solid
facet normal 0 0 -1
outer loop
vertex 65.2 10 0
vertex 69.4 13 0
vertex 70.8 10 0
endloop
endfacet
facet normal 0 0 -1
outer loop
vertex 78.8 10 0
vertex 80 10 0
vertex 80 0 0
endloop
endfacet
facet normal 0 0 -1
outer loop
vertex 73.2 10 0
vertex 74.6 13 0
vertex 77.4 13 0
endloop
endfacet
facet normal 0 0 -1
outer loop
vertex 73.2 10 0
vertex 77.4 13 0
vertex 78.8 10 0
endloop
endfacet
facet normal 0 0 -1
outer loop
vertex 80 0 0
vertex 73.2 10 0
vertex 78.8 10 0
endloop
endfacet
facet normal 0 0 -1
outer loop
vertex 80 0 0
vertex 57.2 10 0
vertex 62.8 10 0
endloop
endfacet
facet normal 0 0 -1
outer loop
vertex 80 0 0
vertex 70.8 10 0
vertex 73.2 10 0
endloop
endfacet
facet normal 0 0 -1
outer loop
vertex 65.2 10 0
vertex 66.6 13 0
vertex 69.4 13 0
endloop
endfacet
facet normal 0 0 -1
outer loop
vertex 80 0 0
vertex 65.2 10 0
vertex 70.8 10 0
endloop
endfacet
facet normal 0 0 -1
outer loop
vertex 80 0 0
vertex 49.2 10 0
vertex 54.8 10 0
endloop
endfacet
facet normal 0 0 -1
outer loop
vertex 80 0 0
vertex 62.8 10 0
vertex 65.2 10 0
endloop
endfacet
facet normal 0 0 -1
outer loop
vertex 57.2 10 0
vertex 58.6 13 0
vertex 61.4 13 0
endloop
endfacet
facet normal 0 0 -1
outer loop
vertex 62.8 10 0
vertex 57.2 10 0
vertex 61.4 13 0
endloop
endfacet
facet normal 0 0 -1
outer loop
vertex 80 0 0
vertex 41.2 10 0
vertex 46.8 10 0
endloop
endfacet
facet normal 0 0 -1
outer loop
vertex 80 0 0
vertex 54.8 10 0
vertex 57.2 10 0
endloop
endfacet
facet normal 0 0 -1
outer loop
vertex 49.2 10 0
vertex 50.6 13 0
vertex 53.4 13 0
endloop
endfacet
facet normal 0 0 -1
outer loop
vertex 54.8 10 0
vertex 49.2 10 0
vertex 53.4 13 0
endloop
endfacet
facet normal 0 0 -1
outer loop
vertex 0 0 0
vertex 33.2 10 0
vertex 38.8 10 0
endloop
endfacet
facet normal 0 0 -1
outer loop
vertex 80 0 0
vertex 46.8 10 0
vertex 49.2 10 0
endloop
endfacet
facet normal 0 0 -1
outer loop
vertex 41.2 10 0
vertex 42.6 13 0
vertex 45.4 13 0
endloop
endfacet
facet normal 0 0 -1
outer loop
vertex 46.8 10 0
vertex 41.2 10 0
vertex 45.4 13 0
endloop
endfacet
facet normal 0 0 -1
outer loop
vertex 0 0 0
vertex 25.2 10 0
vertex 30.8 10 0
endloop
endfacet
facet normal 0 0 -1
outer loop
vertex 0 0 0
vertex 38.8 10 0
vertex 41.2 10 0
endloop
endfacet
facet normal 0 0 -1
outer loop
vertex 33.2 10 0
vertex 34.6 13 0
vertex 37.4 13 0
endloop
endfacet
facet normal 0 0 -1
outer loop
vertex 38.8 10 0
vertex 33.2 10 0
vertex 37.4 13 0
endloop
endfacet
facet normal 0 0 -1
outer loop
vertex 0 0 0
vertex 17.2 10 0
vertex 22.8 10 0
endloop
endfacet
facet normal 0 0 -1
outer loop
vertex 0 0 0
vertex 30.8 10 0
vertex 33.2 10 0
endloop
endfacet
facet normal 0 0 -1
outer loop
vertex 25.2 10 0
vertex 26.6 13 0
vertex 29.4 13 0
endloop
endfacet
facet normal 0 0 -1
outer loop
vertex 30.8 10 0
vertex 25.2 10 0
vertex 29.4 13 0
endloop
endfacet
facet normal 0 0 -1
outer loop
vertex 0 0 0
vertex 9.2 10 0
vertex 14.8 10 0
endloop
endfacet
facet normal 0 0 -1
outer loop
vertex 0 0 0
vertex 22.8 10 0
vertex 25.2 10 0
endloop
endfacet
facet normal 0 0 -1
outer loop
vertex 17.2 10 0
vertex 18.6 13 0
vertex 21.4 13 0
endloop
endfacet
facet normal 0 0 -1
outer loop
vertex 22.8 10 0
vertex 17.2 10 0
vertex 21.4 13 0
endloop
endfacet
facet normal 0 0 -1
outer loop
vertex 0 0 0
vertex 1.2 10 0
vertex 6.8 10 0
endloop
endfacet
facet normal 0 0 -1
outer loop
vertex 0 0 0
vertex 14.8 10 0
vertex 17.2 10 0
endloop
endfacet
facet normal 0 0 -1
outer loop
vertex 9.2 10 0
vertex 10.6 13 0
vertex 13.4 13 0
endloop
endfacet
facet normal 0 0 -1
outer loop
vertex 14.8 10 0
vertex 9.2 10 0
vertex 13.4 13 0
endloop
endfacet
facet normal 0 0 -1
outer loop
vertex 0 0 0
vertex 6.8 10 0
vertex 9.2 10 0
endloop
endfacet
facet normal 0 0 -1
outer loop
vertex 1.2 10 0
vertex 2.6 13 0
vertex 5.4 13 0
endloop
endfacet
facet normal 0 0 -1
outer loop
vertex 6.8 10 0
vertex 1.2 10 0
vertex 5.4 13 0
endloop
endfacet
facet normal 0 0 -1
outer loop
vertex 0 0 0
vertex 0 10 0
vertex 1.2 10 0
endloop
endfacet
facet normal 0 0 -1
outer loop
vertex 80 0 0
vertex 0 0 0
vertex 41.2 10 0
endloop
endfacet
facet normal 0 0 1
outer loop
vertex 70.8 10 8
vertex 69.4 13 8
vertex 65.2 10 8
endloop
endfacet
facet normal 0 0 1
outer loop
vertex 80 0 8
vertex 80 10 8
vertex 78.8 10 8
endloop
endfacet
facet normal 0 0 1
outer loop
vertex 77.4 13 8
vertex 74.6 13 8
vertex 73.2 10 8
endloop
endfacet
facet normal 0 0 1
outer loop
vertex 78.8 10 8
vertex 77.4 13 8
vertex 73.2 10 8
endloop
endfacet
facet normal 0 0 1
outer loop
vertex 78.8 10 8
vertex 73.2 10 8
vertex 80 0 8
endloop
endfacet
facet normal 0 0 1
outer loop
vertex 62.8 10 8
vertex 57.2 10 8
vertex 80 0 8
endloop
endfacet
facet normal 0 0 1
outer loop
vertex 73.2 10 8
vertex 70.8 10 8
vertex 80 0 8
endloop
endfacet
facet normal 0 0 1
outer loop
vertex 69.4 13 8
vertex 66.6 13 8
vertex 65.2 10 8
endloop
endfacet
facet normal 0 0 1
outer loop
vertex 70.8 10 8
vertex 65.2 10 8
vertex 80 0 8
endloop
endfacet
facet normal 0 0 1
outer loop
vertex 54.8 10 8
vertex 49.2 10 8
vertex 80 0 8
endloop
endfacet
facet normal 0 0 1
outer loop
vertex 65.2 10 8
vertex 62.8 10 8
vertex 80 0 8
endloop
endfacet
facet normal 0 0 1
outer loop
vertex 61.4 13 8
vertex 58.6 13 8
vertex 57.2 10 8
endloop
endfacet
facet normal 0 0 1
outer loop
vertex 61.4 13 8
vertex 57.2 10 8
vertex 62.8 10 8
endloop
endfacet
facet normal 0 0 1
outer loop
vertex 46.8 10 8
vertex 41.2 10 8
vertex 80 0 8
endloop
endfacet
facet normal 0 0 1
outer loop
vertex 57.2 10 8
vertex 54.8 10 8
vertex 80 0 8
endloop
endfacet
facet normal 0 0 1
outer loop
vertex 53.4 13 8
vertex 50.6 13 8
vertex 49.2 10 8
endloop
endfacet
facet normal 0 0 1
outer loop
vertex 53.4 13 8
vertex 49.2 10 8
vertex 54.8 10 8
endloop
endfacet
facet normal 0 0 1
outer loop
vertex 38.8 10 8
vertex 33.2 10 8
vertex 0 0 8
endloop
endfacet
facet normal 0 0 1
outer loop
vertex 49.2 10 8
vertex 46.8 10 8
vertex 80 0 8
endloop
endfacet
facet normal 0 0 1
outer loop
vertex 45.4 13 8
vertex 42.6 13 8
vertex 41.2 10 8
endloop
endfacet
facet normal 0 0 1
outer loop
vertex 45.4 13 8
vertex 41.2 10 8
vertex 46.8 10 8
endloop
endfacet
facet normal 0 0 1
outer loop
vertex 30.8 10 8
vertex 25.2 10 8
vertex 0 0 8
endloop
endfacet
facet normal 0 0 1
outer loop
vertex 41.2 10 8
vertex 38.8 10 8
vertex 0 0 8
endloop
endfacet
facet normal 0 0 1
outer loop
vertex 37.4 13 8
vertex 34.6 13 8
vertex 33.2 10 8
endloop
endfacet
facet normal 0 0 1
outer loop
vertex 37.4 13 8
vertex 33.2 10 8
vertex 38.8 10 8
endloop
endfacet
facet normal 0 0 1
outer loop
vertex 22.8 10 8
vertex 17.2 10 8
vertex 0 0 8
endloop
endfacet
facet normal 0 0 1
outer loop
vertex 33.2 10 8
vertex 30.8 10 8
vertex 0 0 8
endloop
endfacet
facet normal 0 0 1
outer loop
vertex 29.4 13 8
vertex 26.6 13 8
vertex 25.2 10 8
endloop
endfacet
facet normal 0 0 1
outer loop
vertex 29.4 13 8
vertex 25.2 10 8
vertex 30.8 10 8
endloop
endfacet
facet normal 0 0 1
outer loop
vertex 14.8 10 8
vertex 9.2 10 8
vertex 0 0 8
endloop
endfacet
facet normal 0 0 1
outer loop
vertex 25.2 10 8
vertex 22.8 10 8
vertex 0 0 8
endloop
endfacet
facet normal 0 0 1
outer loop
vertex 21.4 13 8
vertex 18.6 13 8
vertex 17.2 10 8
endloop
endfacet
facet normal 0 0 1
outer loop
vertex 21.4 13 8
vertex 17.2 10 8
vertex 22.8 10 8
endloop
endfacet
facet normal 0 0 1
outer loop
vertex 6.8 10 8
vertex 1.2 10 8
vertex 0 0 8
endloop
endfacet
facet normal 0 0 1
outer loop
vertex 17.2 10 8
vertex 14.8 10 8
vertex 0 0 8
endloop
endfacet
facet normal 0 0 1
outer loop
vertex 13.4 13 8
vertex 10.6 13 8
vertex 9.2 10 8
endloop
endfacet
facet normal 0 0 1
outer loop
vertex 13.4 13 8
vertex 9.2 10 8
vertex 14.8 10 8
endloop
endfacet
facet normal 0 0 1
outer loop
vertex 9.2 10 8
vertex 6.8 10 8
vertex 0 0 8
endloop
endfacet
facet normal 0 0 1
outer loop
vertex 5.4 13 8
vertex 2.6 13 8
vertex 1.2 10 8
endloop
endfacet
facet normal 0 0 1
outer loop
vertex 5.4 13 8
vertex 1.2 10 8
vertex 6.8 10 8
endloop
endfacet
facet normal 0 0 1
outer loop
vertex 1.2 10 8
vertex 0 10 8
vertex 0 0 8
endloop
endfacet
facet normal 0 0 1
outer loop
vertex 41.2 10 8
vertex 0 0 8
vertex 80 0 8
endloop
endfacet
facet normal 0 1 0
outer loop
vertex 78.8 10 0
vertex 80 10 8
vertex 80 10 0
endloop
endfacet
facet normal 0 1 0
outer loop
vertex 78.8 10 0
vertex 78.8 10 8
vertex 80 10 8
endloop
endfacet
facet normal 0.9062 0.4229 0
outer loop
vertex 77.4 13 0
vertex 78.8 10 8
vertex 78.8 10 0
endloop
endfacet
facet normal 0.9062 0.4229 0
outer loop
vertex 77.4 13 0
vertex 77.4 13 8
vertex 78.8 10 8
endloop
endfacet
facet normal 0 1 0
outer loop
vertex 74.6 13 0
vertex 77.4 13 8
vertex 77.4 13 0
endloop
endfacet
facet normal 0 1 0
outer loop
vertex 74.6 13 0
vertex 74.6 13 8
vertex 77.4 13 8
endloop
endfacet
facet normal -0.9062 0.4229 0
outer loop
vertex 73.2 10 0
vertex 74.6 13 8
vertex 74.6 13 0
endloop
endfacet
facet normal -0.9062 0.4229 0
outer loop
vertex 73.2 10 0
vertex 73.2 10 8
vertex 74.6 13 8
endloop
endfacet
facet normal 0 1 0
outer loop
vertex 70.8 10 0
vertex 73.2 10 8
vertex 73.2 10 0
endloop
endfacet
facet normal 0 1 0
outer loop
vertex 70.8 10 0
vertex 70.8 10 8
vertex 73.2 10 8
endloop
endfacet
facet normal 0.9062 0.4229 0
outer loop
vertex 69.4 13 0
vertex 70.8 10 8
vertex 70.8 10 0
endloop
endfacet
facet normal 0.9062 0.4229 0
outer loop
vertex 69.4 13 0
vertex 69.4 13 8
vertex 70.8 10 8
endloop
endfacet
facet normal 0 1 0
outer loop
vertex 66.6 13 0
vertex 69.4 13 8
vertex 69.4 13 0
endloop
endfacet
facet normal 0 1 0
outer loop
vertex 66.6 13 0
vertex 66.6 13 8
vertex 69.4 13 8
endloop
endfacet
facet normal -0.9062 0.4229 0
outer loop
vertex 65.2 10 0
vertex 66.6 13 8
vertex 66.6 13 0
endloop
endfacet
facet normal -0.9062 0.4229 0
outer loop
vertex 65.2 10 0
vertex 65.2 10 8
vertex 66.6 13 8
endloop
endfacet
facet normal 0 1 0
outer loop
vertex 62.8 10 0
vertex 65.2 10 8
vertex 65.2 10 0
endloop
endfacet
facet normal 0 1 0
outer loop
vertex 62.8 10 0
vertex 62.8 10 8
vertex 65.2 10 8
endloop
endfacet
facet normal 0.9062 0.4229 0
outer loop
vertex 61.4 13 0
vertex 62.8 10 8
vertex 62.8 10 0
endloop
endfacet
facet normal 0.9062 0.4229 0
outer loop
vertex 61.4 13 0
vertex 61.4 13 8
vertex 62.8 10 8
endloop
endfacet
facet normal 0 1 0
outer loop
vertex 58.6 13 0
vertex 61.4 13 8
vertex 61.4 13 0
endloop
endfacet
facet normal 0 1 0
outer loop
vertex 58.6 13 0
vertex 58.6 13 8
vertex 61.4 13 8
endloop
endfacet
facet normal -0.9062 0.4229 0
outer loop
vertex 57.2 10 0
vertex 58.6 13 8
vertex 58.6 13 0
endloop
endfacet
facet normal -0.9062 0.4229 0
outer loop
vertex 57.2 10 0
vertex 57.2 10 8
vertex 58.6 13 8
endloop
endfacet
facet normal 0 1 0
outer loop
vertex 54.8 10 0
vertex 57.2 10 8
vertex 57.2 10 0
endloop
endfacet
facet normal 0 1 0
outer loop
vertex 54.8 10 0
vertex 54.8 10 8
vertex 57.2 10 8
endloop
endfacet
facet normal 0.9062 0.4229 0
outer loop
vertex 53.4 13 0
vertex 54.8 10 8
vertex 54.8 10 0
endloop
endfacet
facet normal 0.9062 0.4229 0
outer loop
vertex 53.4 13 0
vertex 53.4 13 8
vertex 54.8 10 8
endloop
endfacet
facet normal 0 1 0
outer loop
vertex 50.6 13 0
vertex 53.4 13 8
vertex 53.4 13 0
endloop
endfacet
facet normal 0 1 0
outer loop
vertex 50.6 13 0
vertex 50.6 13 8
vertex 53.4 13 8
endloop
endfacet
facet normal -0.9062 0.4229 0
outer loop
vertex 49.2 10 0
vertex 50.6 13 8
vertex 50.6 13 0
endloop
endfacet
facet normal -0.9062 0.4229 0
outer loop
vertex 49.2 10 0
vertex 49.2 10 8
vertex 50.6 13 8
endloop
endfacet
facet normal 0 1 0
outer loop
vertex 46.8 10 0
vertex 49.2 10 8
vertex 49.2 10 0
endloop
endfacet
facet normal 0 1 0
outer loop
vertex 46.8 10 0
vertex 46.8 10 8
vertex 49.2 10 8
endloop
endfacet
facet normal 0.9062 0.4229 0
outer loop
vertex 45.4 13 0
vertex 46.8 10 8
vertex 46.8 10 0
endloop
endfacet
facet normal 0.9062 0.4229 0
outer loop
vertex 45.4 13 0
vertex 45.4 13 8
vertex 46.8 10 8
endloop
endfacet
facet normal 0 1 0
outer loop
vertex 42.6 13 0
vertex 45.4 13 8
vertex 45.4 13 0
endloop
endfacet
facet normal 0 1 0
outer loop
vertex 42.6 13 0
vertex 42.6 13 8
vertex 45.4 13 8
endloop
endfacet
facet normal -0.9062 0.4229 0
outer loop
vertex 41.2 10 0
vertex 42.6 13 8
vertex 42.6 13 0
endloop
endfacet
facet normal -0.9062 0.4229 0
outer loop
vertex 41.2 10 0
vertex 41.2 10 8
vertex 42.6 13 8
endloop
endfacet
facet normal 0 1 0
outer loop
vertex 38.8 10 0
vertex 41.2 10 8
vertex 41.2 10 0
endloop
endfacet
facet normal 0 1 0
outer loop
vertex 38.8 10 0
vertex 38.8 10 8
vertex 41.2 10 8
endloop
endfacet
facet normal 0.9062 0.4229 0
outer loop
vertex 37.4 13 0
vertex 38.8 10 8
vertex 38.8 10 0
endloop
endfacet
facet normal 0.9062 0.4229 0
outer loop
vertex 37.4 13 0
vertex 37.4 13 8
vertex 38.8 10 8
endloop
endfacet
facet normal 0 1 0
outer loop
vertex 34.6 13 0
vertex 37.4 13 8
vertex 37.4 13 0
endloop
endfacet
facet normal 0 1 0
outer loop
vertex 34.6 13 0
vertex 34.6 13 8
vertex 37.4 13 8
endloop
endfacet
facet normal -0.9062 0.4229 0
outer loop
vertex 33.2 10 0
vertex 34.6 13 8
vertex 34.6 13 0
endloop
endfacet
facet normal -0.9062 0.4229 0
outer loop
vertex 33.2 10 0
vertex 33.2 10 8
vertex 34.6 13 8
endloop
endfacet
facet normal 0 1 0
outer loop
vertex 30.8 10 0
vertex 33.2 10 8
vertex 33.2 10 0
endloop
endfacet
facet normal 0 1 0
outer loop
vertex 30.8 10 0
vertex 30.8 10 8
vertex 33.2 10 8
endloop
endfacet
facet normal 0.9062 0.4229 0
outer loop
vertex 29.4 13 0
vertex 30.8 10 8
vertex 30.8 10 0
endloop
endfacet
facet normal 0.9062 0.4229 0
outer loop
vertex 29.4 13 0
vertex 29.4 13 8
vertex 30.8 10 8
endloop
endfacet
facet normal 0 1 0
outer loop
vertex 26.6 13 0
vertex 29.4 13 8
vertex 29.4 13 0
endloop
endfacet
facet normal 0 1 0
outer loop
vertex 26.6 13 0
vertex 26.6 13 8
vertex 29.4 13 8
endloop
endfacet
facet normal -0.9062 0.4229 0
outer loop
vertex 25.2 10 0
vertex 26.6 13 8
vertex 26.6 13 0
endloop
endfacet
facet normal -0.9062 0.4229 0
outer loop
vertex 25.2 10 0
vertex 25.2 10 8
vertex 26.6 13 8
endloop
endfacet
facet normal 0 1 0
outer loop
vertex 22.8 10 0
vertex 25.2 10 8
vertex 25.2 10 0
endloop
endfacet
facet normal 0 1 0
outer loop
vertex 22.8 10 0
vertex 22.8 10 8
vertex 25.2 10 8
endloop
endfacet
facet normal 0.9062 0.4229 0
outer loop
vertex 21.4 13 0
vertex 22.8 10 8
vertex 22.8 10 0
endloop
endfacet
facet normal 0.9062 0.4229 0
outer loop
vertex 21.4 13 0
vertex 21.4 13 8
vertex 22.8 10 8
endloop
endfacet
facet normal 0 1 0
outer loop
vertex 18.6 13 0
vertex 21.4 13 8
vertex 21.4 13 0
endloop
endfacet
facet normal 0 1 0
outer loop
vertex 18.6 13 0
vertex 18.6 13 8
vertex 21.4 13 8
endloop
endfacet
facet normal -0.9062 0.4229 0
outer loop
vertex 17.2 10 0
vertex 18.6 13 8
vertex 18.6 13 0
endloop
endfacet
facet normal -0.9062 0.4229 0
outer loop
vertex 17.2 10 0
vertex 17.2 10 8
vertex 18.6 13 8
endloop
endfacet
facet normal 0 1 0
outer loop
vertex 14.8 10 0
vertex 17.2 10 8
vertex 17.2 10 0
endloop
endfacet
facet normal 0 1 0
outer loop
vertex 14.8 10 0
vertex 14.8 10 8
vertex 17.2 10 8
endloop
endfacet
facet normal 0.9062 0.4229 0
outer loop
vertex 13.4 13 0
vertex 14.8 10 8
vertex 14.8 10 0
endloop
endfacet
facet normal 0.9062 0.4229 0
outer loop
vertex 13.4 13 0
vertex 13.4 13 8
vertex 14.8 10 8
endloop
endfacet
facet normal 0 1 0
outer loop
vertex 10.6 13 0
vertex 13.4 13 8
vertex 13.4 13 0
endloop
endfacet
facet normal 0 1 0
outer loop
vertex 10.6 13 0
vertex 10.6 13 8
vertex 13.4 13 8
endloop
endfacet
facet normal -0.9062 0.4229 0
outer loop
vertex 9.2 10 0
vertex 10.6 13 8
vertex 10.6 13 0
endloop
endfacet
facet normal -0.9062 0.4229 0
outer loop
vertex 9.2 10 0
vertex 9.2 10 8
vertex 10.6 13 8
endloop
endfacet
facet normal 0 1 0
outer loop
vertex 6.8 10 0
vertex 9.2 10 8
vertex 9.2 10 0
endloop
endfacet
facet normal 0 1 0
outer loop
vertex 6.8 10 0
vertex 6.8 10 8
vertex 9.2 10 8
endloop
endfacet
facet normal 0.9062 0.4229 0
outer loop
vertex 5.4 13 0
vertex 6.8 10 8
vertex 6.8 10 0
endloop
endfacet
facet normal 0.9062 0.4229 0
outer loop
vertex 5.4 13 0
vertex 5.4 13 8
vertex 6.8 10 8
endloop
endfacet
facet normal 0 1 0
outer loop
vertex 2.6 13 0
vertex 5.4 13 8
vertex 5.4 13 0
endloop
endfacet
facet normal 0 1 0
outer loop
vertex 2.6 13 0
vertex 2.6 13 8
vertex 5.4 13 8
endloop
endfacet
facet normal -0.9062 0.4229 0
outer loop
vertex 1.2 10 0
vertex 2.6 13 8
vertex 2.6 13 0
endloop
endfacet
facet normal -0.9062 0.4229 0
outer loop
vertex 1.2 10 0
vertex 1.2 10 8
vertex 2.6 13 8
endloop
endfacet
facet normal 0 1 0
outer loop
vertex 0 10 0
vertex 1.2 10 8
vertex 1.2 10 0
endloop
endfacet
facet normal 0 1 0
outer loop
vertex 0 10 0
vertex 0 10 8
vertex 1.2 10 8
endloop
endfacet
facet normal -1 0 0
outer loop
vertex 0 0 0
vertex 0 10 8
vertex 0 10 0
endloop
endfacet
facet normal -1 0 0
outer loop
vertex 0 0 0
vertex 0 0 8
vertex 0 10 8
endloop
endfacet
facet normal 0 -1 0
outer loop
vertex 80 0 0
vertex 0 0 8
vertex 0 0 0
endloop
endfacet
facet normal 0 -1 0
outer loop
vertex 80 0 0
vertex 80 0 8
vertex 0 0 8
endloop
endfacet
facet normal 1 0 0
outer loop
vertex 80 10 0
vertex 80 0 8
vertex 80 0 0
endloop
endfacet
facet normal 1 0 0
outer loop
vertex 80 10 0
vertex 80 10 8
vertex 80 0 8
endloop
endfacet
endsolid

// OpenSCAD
$fn = 32;

// ----------------------------------------------------------------------
// Gear rack: 10 teeth, pitch 8 mm
// ----------------------------------------------------------------------

// --- parameters (mm) ---
teeth = 10;               // number of teeth
pitch = 8;                // tooth pitch, X
root_w = 5.6;             // tooth width at the root
tip_w = 2.8;              // tooth width at the tip
base_h = 10;              // rack body height, Y
tooth_h = 3;              // tooth height above the body
plate_t = 8;              // rack width, Z (extrusion height)

rack_l = teeth * pitch;  // overall length
total_h = base_h + tooth_h;  // overall height

profile = [[0, 0], [80, 0], [80, 10], [78.8, 10], [77.4, 13], [74.6, 13], [73.2, 10], [70.8, 10], [69.4, 13], [66.6, 13], [65.2, 10], [62.8, 10], [61.4, 13], [58.6, 13], [57.2, 10], [54.8, 10], [53.4, 13], [50.6, 13], [49.2, 10], [46.8, 10], [45.4, 13], [42.6, 13], [41.2, 10], [38.8, 10], [37.4, 13], [34.6, 13], [33.2, 10], [30.8, 10], [29.4, 13], [26.6, 13], [25.2, 10], [22.8, 10], [21.4, 13], [18.6, 13], [17.2, 10], [14.8, 10], [13.4, 13], [10.6, 13], [9.2, 10], [6.8, 10], [5.4, 13], [2.6, 13], [1.2, 10], [0, 10]];  // primary outline, 44 points, counter clockwise

// --- the one profile operation ---
linear_extrude(height = plate_t) polygon(points = profile);
